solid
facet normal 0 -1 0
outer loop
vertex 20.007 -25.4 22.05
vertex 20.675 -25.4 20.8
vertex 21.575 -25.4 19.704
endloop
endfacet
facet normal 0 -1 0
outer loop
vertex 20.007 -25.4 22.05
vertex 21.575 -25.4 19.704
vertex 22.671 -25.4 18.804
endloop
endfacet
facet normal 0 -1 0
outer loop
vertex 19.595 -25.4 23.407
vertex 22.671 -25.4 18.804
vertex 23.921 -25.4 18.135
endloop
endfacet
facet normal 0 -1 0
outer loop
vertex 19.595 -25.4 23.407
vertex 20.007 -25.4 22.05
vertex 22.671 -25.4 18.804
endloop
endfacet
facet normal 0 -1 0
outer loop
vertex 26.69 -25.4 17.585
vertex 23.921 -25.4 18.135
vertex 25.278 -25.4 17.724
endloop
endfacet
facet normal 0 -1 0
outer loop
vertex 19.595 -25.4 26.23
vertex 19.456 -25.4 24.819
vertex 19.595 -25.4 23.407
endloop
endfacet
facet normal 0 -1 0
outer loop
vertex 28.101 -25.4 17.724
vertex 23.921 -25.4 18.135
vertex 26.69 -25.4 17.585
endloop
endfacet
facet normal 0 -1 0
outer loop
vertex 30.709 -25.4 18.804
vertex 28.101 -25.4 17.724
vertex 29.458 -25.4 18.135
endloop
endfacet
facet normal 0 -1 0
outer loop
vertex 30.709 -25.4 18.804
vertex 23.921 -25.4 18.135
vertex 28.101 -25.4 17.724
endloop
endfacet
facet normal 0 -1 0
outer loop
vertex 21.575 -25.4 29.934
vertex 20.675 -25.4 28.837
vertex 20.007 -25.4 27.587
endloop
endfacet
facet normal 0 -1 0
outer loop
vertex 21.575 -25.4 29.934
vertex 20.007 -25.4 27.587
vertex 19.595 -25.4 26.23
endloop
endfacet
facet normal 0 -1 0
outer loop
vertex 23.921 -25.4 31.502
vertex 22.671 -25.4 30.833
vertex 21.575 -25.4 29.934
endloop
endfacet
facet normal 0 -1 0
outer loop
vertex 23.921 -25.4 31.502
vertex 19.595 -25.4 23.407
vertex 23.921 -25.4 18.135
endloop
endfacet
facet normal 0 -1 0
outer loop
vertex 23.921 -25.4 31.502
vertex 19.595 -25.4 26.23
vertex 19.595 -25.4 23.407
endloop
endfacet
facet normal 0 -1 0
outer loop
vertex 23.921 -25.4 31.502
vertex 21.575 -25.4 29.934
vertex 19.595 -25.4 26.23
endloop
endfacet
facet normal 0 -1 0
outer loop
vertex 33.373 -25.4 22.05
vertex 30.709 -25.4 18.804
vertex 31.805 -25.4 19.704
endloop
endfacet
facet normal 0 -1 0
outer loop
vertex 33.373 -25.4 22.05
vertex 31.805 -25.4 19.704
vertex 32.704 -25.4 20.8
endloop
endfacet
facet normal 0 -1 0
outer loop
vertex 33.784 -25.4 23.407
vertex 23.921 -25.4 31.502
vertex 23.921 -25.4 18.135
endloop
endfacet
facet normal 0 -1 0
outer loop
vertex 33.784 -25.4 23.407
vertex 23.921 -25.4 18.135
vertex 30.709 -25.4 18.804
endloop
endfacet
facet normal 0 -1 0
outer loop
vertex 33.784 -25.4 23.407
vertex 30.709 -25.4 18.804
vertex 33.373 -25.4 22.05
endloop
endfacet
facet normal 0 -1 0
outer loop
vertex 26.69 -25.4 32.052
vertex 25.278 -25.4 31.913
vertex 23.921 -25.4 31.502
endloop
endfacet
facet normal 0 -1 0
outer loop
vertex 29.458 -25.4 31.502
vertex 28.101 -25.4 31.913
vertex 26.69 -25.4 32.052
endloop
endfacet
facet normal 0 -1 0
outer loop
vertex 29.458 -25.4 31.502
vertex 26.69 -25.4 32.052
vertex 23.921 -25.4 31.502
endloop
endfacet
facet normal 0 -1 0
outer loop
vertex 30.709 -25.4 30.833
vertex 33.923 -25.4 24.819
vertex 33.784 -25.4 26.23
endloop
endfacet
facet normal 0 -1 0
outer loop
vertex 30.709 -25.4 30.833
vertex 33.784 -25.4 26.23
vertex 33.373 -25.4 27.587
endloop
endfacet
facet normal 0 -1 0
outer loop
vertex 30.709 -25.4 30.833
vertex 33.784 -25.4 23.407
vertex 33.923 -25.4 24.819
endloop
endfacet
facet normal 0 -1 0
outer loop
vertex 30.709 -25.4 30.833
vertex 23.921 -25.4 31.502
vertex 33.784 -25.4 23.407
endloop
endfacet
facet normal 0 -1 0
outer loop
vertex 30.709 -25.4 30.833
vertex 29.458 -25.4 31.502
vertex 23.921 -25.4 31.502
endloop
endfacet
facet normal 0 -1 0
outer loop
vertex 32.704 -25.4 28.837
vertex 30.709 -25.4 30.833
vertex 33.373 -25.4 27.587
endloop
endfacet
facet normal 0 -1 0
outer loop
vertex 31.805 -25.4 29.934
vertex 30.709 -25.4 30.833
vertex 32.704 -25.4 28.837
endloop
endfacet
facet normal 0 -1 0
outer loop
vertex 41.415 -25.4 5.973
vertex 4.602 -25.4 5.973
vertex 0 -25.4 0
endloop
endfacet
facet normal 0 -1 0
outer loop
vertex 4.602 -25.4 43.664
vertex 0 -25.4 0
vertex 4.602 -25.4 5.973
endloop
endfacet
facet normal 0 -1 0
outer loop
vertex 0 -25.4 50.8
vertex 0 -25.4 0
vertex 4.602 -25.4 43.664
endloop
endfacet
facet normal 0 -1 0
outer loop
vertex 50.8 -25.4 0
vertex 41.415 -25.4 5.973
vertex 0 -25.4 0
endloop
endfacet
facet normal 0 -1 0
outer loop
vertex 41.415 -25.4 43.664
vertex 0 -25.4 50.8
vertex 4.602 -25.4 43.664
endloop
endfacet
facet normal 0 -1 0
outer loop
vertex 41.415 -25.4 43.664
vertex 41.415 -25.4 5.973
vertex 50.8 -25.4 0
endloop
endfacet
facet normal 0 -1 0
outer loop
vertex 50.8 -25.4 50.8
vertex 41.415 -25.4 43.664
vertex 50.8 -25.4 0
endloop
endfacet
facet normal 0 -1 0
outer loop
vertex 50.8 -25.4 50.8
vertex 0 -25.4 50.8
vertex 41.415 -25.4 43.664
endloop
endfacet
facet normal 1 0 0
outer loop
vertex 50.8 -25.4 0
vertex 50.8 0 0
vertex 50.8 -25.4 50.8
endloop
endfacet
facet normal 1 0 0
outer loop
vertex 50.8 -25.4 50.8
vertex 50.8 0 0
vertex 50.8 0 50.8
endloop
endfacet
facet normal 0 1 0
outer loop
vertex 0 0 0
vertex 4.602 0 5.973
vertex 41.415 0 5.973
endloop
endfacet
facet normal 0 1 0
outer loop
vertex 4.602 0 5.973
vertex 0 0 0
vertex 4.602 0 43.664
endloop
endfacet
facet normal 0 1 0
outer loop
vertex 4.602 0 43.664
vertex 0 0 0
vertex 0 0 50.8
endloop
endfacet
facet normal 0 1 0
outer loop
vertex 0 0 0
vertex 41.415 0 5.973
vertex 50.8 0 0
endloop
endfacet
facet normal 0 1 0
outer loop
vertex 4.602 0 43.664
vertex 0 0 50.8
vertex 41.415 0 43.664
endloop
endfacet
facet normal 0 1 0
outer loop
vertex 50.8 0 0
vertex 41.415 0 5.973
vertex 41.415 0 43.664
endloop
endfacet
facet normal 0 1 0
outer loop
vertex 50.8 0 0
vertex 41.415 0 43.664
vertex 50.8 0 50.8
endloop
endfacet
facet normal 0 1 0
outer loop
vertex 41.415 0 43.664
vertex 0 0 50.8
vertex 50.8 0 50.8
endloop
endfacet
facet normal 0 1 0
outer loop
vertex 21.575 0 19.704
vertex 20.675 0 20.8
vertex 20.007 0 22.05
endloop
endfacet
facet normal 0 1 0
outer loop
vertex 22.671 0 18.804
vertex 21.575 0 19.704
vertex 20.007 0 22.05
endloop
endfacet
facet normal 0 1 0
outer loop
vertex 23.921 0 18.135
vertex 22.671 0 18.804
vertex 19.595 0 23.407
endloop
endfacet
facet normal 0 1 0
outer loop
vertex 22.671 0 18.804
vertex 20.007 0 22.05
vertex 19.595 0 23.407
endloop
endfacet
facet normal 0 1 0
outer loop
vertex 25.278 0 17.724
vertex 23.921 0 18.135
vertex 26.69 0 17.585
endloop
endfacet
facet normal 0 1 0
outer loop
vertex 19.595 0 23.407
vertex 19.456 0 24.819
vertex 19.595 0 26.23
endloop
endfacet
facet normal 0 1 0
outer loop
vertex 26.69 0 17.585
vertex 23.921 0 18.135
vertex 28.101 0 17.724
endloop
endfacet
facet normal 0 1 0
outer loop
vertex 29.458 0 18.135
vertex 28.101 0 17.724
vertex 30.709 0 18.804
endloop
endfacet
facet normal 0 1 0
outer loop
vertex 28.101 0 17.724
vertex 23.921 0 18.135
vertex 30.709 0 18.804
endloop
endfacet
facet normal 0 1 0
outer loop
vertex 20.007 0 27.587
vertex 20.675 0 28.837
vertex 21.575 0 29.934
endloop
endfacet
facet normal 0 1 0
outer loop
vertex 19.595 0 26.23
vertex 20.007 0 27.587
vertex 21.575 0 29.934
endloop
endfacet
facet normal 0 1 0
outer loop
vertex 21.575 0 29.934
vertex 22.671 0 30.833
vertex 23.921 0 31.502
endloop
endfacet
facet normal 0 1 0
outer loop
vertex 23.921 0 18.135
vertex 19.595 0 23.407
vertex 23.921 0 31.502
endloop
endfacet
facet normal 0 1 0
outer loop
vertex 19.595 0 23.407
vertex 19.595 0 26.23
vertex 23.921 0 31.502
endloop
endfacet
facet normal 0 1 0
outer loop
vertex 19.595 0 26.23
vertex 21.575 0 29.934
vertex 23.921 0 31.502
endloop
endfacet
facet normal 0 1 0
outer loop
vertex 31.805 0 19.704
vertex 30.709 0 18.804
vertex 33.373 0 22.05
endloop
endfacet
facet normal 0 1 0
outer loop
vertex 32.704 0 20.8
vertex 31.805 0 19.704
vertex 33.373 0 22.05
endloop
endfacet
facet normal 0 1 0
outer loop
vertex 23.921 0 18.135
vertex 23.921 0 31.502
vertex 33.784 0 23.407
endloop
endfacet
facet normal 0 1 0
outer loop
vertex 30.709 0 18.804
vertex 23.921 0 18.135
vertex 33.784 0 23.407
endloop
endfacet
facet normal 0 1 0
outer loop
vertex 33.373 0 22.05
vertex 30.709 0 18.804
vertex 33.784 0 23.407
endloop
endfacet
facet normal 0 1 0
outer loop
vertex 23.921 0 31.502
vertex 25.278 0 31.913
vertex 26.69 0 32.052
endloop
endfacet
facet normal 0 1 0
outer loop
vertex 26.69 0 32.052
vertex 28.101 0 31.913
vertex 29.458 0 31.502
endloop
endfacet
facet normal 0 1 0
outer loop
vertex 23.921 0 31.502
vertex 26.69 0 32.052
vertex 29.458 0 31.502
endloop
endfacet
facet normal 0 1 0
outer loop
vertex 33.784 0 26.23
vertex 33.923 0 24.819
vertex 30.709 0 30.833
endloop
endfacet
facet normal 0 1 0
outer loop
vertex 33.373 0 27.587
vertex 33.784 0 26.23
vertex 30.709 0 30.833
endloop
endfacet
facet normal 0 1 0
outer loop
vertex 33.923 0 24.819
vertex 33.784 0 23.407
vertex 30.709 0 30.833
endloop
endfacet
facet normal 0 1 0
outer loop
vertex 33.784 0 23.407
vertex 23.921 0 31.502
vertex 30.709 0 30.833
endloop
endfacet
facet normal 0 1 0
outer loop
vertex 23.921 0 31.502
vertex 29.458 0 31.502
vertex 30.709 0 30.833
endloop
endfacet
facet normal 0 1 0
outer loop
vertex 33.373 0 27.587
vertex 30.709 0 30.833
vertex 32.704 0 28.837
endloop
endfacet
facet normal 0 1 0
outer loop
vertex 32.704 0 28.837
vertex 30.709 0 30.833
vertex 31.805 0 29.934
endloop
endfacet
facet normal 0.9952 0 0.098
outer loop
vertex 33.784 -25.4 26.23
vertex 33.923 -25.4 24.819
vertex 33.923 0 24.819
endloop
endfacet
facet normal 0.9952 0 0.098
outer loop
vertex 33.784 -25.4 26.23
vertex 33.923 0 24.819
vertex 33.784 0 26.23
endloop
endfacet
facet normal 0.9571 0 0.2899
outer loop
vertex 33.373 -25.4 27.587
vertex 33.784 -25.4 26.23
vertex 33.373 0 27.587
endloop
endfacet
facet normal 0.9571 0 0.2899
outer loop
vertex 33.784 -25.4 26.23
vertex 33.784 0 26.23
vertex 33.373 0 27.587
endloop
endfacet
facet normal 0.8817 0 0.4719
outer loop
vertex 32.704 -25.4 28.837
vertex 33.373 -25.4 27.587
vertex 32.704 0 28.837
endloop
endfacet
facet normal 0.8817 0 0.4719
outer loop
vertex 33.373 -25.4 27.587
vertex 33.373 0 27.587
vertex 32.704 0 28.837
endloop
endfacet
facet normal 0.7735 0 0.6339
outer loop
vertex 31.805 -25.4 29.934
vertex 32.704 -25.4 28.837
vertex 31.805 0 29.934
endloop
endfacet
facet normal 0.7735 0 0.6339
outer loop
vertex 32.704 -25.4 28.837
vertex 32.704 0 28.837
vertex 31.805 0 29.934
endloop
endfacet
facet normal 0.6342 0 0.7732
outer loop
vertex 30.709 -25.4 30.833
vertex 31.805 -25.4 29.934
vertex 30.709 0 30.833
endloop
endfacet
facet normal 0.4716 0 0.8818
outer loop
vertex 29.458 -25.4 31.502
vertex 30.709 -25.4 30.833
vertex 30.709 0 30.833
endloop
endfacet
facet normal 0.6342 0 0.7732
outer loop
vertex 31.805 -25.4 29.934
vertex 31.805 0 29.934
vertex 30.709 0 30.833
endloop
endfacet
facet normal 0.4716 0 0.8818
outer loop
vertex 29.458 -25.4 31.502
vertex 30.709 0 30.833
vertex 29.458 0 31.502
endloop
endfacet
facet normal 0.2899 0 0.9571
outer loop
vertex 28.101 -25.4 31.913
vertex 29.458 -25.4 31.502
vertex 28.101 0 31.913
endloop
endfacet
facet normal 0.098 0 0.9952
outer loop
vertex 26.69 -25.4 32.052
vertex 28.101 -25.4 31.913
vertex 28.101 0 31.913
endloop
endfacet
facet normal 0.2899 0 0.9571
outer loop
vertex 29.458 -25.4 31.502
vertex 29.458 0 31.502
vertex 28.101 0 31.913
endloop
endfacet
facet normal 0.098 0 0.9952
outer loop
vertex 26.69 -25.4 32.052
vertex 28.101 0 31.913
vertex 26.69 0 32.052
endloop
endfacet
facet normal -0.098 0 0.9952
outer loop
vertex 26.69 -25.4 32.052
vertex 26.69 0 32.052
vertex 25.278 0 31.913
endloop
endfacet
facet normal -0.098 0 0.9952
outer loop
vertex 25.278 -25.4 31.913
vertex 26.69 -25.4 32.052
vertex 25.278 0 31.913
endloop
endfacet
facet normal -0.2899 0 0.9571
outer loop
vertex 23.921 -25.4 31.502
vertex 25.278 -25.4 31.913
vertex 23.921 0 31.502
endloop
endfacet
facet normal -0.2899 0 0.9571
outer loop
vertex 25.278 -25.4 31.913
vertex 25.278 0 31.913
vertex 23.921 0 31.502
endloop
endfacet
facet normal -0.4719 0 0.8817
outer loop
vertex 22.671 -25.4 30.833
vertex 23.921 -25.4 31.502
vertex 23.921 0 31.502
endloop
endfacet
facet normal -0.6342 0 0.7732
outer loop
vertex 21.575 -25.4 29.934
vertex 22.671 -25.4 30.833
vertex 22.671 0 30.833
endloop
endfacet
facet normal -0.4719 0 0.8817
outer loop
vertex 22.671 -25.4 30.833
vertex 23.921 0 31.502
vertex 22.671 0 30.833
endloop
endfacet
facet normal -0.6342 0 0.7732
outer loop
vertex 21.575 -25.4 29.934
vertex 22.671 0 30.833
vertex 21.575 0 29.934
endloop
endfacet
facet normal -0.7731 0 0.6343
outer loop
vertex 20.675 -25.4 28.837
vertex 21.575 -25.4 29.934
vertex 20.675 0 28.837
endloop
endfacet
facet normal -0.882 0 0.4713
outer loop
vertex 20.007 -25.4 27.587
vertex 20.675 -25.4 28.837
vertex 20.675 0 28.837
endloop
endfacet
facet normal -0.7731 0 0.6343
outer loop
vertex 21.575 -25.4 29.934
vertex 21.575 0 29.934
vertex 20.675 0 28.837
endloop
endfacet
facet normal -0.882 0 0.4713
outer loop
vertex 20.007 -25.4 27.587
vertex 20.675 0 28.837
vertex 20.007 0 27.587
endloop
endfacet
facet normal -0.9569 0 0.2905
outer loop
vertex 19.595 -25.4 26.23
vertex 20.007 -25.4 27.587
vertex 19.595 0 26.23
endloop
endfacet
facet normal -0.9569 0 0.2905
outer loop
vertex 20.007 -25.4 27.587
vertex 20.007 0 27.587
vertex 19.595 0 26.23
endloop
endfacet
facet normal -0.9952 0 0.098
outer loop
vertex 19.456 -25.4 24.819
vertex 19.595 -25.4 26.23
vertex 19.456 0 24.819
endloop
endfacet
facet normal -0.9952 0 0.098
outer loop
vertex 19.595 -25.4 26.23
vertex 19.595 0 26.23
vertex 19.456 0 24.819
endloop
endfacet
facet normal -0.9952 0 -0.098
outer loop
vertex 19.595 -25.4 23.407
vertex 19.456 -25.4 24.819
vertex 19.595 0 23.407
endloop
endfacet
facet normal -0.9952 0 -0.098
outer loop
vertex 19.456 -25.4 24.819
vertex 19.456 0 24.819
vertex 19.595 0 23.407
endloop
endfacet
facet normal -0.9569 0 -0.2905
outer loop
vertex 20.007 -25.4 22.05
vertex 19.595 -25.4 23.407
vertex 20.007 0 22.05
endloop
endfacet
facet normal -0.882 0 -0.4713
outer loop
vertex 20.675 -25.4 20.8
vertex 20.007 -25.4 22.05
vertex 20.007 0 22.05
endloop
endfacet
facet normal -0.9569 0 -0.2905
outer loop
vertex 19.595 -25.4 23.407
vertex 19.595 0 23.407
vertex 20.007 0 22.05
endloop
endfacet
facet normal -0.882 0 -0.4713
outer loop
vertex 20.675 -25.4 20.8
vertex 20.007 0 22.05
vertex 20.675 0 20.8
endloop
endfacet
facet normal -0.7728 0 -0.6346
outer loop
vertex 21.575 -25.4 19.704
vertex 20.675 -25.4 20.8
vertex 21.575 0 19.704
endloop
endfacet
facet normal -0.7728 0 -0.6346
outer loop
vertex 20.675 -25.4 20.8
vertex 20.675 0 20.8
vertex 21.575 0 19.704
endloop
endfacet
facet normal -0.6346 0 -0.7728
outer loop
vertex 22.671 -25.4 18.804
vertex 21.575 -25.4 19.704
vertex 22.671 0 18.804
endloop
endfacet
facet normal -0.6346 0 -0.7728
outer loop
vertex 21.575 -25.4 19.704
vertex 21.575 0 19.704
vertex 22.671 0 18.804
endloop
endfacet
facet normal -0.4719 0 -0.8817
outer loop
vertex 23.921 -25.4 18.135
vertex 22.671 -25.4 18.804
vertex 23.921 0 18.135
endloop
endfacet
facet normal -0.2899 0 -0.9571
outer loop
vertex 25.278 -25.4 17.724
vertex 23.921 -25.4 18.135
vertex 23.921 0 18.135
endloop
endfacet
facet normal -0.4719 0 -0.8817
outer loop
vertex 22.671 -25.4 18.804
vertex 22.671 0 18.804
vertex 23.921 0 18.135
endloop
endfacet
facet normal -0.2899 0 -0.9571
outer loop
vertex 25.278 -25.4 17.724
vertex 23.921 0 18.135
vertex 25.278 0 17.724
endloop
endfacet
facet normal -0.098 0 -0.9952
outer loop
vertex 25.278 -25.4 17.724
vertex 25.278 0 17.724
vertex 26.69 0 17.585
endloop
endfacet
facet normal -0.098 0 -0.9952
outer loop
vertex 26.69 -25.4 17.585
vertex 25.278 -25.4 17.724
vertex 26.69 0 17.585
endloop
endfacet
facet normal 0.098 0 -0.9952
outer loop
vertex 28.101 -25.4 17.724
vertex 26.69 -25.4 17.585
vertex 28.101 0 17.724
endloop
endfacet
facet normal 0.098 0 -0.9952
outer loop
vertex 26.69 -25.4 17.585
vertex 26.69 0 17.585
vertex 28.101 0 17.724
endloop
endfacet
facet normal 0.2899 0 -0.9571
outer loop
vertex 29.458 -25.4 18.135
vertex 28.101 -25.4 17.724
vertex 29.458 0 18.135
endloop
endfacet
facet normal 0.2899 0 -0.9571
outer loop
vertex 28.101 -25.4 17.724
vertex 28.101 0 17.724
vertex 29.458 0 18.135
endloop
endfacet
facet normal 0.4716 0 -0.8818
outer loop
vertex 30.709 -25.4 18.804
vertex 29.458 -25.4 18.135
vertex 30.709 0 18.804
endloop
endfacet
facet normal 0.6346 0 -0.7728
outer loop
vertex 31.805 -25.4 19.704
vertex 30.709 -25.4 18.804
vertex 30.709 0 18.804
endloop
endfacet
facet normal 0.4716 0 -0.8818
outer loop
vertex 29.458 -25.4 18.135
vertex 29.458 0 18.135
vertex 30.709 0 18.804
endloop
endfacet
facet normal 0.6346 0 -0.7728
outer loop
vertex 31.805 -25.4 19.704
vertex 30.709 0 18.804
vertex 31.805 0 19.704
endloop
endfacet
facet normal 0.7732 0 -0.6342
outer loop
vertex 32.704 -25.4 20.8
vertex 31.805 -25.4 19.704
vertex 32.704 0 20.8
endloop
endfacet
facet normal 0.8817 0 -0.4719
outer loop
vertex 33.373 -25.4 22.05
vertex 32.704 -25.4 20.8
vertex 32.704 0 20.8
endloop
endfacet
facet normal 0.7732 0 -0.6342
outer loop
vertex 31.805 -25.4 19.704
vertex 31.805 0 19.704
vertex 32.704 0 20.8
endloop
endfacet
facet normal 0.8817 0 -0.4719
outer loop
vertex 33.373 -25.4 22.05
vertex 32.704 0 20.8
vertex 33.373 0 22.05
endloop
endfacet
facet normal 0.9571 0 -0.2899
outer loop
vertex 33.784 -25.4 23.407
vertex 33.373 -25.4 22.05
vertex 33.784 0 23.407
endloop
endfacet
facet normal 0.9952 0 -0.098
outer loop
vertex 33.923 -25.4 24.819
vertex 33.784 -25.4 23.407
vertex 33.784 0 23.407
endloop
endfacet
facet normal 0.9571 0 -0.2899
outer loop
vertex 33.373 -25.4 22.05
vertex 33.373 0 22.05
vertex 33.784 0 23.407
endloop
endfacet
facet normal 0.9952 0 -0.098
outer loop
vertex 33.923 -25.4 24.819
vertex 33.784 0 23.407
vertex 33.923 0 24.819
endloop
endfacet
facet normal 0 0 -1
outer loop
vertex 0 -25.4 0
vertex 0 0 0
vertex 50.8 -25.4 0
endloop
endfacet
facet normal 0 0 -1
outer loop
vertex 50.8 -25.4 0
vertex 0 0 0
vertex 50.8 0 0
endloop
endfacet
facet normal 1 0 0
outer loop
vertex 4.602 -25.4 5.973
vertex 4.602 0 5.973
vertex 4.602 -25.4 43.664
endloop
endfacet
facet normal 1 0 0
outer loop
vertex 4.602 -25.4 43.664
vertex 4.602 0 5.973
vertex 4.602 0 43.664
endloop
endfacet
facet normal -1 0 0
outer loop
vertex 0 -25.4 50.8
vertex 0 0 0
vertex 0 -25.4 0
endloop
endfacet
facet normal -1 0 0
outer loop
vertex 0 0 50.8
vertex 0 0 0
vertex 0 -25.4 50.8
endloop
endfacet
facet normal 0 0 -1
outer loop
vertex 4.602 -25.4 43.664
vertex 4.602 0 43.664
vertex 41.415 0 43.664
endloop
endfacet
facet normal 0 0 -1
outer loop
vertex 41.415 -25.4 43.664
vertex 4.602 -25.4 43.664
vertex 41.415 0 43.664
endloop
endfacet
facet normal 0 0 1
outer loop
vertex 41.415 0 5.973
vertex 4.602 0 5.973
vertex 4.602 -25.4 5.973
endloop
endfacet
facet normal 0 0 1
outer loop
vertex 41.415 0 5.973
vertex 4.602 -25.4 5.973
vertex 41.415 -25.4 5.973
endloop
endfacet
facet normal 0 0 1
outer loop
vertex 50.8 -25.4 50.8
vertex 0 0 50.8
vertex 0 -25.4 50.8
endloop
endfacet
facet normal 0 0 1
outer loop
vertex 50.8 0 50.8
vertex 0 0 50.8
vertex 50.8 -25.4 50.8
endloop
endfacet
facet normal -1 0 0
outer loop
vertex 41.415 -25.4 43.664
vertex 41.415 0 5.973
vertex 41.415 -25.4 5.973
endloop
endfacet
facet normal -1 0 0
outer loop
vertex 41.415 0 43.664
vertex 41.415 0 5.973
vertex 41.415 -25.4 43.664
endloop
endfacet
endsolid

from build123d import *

# Parameters (mm, degrees)
F0_W     = 50.8
F0_H     = 50.8
F0_W_2   = 36.813344
F0_H_2   = 37.690434
F0_R     = 7.233706
F1_DEPTH = 25.4


with BuildPart() as f1:
    # F0 (on Front) → F1 (new body)
    with BuildSketch(Plane.XZ):
        with Locations((25.4, 25.4)):
            Rectangle(F0_W, F0_H)
        with Locations((23.008345, 24.818531)):
            Rectangle(F0_W_2, F0_H_2, mode=Mode.SUBTRACT)
        with Locations((26.68968, 24.818531)):
            Circle(F0_R)
    extrude(amount=F1_DEPTH)


solid = f1.part
